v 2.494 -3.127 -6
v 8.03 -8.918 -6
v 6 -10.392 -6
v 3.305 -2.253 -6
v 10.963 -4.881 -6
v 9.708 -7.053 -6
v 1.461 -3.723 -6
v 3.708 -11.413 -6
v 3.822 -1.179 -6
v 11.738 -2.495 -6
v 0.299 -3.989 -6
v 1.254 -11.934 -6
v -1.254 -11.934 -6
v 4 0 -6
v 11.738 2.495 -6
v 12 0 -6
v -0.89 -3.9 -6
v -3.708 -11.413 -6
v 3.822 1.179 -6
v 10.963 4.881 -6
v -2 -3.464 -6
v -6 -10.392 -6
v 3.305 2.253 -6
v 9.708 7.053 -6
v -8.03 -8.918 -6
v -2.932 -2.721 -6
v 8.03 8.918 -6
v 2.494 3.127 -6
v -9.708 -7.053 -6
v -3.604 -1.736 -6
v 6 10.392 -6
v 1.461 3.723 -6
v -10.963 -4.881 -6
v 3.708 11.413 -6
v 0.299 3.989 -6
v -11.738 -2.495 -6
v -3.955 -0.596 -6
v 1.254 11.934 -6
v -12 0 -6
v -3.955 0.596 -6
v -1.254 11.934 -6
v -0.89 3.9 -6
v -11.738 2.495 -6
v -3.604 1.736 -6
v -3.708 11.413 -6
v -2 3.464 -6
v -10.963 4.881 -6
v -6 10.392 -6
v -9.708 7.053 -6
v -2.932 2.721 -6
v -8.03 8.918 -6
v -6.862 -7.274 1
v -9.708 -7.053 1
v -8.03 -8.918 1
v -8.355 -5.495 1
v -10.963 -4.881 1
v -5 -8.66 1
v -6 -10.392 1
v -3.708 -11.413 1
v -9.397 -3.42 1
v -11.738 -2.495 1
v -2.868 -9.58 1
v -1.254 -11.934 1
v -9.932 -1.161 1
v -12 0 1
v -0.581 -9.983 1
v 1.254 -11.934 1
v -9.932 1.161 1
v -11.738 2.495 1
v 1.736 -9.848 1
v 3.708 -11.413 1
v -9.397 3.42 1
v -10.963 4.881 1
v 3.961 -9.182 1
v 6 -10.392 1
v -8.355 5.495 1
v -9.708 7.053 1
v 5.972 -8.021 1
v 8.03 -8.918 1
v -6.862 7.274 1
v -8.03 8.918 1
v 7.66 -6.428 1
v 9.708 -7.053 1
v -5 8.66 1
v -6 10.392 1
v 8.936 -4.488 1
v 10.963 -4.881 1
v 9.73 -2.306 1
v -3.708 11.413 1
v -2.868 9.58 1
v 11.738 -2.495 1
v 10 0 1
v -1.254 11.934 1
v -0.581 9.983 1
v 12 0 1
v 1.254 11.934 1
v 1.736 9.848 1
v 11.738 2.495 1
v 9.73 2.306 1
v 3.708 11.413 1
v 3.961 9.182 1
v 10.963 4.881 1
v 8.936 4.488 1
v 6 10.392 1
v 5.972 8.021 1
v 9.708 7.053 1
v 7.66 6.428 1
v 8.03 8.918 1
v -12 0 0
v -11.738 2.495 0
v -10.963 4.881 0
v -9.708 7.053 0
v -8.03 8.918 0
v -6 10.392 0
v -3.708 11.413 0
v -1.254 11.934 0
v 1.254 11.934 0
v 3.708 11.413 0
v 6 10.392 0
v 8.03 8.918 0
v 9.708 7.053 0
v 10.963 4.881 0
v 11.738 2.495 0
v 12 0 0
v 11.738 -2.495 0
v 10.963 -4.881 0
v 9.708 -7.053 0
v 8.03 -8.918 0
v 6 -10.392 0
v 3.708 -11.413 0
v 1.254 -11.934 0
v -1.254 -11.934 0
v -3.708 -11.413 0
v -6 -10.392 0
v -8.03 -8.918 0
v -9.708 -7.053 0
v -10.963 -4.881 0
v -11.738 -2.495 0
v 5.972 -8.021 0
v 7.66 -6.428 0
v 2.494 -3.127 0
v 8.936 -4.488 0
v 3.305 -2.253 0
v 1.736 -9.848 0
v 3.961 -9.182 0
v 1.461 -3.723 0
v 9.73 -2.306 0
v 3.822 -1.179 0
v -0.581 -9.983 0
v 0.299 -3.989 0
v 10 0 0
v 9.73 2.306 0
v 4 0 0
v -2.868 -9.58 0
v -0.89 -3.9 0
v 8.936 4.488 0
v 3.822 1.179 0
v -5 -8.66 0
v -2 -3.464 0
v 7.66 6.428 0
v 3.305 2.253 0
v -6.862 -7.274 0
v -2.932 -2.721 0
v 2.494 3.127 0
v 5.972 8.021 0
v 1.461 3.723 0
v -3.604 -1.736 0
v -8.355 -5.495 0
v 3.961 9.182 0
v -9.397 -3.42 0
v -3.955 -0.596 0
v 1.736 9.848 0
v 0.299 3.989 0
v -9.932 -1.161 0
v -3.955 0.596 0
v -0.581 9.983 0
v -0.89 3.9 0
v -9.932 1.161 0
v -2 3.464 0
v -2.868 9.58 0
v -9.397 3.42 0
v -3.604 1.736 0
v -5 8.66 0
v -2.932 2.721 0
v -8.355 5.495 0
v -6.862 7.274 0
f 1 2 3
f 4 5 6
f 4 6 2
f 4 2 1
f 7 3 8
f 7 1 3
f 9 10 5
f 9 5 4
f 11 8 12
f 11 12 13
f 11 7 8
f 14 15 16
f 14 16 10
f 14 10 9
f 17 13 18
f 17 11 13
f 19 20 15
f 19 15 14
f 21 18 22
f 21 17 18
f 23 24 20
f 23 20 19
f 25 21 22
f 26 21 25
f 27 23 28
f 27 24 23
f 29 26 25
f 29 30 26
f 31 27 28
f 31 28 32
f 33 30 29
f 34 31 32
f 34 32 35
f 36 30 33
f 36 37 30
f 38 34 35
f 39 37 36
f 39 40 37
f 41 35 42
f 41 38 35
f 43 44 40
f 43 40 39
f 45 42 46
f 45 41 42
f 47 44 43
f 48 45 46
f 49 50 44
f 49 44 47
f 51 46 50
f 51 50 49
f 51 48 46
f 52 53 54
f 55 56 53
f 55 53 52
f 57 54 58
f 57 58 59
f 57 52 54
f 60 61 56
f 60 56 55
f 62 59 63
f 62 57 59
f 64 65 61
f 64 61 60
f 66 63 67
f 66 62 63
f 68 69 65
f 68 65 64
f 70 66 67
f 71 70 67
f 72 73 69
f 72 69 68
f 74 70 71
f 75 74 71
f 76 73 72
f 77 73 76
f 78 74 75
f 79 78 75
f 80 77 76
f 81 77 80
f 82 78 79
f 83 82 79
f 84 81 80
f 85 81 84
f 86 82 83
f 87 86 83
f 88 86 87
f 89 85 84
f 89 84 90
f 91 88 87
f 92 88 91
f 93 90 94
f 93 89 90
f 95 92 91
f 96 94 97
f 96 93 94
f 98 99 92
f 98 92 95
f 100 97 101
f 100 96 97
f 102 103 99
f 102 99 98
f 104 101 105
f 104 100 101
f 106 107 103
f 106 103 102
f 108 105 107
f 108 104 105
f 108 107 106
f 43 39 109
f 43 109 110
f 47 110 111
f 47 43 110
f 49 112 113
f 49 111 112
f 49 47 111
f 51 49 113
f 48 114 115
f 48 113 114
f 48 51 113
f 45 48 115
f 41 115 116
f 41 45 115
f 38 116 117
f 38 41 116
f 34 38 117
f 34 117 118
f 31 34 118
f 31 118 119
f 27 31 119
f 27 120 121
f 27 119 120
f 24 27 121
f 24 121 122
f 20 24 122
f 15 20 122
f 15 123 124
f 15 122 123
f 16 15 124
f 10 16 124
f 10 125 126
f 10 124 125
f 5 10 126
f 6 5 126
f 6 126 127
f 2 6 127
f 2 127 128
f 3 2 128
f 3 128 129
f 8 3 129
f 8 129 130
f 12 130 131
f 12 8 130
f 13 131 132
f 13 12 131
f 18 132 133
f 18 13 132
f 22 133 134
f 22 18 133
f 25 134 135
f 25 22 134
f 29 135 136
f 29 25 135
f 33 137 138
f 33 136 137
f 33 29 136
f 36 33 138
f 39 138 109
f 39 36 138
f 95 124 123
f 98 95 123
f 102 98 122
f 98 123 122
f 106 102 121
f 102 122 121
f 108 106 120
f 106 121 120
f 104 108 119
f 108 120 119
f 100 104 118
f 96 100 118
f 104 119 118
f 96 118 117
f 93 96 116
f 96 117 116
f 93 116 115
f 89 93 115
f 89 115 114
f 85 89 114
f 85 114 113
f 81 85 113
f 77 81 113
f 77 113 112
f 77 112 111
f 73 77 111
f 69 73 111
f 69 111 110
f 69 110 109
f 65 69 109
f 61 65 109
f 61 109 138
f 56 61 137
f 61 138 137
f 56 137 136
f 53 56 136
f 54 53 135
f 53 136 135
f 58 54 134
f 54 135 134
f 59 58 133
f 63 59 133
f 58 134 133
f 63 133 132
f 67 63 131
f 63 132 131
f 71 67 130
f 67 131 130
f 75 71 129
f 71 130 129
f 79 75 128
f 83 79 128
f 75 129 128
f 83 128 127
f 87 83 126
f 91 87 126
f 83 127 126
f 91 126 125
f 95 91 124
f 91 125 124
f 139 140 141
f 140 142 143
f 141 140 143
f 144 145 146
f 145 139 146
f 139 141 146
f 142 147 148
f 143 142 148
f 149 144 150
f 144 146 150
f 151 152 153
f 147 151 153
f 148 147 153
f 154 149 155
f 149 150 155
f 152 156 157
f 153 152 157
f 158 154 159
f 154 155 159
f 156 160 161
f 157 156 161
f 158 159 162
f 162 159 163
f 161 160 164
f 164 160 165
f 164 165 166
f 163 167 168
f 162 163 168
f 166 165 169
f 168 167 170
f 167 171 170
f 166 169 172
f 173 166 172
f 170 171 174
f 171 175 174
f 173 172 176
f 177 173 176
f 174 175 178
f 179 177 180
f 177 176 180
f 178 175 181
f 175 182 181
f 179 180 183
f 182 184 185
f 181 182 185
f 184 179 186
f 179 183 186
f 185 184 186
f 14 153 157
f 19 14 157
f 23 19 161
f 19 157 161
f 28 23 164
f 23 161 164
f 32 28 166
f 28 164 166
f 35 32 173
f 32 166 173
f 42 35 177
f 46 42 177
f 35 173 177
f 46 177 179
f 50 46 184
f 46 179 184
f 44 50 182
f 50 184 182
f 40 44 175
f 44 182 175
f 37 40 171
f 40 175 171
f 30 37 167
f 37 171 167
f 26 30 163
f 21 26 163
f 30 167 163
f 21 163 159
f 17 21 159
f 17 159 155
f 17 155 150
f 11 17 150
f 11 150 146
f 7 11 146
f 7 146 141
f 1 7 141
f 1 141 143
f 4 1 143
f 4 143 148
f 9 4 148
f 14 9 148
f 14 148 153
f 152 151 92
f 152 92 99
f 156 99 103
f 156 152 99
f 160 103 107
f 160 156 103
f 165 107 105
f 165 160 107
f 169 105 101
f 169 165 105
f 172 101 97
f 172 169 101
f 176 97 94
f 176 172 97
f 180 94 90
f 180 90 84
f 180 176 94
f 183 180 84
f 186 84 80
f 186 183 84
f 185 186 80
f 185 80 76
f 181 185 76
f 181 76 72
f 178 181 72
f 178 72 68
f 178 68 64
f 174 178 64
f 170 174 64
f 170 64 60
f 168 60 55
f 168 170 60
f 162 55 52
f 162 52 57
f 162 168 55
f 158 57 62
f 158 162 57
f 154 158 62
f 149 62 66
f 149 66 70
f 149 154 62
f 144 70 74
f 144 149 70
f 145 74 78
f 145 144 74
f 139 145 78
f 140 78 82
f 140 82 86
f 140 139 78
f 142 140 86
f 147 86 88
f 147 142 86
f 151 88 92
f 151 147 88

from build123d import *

# Parameters (mm, degrees)
SKETCH1_R           = 12
SKETCH1_R_2         = 10
BOSS_EXTRUDE1_DEPTH = 1
BOSS_EXTRUDE2_START = 6
SKETCH2_R           = 12
BOSS_EXTRUDE2_DEPTH = 6
SKETCH3_R           = 4
CUT_EXTRUDE1_DEPTH  = 13


with BuildPart() as part:
    # Sketch1 → Boss-Extrude1 (new body)
    with BuildSketch(Plane(origin=(0, 0, 0), x_dir=(0, 1, 0), z_dir=(0, 0, 1))):
        with Locations(Location((0, 0, 0), (0, 0, 270))):
            Circle(SKETCH1_R)
        with Locations(Location((0, 0, 0), (0, 0, 270))):
            Circle(SKETCH1_R_2, mode=Mode.SUBTRACT)
    extrude(amount=BOSS_EXTRUDE1_DEPTH)

    # Sketch2 → Boss-Extrude2 (add)
    with BuildSketch(Plane(origin=(0, 0, 0), x_dir=(1, 0, 0), z_dir=(0, 0, -1)).offset(BOSS_EXTRUDE2_START)):
        with Locations(Location((0, 0, 0), (0, 0, 180))):
            Circle(SKETCH2_R)
    extrude(amount=-BOSS_EXTRUDE2_DEPTH)

    # Sketch3 → Cut-Extrude1 (cut)
    with BuildSketch(Plane.XY):
        Circle(SKETCH3_R)
    extrude(amount=-CUT_EXTRUDE1_DEPTH, mode=Mode.SUBTRACT)


solid = part.part
